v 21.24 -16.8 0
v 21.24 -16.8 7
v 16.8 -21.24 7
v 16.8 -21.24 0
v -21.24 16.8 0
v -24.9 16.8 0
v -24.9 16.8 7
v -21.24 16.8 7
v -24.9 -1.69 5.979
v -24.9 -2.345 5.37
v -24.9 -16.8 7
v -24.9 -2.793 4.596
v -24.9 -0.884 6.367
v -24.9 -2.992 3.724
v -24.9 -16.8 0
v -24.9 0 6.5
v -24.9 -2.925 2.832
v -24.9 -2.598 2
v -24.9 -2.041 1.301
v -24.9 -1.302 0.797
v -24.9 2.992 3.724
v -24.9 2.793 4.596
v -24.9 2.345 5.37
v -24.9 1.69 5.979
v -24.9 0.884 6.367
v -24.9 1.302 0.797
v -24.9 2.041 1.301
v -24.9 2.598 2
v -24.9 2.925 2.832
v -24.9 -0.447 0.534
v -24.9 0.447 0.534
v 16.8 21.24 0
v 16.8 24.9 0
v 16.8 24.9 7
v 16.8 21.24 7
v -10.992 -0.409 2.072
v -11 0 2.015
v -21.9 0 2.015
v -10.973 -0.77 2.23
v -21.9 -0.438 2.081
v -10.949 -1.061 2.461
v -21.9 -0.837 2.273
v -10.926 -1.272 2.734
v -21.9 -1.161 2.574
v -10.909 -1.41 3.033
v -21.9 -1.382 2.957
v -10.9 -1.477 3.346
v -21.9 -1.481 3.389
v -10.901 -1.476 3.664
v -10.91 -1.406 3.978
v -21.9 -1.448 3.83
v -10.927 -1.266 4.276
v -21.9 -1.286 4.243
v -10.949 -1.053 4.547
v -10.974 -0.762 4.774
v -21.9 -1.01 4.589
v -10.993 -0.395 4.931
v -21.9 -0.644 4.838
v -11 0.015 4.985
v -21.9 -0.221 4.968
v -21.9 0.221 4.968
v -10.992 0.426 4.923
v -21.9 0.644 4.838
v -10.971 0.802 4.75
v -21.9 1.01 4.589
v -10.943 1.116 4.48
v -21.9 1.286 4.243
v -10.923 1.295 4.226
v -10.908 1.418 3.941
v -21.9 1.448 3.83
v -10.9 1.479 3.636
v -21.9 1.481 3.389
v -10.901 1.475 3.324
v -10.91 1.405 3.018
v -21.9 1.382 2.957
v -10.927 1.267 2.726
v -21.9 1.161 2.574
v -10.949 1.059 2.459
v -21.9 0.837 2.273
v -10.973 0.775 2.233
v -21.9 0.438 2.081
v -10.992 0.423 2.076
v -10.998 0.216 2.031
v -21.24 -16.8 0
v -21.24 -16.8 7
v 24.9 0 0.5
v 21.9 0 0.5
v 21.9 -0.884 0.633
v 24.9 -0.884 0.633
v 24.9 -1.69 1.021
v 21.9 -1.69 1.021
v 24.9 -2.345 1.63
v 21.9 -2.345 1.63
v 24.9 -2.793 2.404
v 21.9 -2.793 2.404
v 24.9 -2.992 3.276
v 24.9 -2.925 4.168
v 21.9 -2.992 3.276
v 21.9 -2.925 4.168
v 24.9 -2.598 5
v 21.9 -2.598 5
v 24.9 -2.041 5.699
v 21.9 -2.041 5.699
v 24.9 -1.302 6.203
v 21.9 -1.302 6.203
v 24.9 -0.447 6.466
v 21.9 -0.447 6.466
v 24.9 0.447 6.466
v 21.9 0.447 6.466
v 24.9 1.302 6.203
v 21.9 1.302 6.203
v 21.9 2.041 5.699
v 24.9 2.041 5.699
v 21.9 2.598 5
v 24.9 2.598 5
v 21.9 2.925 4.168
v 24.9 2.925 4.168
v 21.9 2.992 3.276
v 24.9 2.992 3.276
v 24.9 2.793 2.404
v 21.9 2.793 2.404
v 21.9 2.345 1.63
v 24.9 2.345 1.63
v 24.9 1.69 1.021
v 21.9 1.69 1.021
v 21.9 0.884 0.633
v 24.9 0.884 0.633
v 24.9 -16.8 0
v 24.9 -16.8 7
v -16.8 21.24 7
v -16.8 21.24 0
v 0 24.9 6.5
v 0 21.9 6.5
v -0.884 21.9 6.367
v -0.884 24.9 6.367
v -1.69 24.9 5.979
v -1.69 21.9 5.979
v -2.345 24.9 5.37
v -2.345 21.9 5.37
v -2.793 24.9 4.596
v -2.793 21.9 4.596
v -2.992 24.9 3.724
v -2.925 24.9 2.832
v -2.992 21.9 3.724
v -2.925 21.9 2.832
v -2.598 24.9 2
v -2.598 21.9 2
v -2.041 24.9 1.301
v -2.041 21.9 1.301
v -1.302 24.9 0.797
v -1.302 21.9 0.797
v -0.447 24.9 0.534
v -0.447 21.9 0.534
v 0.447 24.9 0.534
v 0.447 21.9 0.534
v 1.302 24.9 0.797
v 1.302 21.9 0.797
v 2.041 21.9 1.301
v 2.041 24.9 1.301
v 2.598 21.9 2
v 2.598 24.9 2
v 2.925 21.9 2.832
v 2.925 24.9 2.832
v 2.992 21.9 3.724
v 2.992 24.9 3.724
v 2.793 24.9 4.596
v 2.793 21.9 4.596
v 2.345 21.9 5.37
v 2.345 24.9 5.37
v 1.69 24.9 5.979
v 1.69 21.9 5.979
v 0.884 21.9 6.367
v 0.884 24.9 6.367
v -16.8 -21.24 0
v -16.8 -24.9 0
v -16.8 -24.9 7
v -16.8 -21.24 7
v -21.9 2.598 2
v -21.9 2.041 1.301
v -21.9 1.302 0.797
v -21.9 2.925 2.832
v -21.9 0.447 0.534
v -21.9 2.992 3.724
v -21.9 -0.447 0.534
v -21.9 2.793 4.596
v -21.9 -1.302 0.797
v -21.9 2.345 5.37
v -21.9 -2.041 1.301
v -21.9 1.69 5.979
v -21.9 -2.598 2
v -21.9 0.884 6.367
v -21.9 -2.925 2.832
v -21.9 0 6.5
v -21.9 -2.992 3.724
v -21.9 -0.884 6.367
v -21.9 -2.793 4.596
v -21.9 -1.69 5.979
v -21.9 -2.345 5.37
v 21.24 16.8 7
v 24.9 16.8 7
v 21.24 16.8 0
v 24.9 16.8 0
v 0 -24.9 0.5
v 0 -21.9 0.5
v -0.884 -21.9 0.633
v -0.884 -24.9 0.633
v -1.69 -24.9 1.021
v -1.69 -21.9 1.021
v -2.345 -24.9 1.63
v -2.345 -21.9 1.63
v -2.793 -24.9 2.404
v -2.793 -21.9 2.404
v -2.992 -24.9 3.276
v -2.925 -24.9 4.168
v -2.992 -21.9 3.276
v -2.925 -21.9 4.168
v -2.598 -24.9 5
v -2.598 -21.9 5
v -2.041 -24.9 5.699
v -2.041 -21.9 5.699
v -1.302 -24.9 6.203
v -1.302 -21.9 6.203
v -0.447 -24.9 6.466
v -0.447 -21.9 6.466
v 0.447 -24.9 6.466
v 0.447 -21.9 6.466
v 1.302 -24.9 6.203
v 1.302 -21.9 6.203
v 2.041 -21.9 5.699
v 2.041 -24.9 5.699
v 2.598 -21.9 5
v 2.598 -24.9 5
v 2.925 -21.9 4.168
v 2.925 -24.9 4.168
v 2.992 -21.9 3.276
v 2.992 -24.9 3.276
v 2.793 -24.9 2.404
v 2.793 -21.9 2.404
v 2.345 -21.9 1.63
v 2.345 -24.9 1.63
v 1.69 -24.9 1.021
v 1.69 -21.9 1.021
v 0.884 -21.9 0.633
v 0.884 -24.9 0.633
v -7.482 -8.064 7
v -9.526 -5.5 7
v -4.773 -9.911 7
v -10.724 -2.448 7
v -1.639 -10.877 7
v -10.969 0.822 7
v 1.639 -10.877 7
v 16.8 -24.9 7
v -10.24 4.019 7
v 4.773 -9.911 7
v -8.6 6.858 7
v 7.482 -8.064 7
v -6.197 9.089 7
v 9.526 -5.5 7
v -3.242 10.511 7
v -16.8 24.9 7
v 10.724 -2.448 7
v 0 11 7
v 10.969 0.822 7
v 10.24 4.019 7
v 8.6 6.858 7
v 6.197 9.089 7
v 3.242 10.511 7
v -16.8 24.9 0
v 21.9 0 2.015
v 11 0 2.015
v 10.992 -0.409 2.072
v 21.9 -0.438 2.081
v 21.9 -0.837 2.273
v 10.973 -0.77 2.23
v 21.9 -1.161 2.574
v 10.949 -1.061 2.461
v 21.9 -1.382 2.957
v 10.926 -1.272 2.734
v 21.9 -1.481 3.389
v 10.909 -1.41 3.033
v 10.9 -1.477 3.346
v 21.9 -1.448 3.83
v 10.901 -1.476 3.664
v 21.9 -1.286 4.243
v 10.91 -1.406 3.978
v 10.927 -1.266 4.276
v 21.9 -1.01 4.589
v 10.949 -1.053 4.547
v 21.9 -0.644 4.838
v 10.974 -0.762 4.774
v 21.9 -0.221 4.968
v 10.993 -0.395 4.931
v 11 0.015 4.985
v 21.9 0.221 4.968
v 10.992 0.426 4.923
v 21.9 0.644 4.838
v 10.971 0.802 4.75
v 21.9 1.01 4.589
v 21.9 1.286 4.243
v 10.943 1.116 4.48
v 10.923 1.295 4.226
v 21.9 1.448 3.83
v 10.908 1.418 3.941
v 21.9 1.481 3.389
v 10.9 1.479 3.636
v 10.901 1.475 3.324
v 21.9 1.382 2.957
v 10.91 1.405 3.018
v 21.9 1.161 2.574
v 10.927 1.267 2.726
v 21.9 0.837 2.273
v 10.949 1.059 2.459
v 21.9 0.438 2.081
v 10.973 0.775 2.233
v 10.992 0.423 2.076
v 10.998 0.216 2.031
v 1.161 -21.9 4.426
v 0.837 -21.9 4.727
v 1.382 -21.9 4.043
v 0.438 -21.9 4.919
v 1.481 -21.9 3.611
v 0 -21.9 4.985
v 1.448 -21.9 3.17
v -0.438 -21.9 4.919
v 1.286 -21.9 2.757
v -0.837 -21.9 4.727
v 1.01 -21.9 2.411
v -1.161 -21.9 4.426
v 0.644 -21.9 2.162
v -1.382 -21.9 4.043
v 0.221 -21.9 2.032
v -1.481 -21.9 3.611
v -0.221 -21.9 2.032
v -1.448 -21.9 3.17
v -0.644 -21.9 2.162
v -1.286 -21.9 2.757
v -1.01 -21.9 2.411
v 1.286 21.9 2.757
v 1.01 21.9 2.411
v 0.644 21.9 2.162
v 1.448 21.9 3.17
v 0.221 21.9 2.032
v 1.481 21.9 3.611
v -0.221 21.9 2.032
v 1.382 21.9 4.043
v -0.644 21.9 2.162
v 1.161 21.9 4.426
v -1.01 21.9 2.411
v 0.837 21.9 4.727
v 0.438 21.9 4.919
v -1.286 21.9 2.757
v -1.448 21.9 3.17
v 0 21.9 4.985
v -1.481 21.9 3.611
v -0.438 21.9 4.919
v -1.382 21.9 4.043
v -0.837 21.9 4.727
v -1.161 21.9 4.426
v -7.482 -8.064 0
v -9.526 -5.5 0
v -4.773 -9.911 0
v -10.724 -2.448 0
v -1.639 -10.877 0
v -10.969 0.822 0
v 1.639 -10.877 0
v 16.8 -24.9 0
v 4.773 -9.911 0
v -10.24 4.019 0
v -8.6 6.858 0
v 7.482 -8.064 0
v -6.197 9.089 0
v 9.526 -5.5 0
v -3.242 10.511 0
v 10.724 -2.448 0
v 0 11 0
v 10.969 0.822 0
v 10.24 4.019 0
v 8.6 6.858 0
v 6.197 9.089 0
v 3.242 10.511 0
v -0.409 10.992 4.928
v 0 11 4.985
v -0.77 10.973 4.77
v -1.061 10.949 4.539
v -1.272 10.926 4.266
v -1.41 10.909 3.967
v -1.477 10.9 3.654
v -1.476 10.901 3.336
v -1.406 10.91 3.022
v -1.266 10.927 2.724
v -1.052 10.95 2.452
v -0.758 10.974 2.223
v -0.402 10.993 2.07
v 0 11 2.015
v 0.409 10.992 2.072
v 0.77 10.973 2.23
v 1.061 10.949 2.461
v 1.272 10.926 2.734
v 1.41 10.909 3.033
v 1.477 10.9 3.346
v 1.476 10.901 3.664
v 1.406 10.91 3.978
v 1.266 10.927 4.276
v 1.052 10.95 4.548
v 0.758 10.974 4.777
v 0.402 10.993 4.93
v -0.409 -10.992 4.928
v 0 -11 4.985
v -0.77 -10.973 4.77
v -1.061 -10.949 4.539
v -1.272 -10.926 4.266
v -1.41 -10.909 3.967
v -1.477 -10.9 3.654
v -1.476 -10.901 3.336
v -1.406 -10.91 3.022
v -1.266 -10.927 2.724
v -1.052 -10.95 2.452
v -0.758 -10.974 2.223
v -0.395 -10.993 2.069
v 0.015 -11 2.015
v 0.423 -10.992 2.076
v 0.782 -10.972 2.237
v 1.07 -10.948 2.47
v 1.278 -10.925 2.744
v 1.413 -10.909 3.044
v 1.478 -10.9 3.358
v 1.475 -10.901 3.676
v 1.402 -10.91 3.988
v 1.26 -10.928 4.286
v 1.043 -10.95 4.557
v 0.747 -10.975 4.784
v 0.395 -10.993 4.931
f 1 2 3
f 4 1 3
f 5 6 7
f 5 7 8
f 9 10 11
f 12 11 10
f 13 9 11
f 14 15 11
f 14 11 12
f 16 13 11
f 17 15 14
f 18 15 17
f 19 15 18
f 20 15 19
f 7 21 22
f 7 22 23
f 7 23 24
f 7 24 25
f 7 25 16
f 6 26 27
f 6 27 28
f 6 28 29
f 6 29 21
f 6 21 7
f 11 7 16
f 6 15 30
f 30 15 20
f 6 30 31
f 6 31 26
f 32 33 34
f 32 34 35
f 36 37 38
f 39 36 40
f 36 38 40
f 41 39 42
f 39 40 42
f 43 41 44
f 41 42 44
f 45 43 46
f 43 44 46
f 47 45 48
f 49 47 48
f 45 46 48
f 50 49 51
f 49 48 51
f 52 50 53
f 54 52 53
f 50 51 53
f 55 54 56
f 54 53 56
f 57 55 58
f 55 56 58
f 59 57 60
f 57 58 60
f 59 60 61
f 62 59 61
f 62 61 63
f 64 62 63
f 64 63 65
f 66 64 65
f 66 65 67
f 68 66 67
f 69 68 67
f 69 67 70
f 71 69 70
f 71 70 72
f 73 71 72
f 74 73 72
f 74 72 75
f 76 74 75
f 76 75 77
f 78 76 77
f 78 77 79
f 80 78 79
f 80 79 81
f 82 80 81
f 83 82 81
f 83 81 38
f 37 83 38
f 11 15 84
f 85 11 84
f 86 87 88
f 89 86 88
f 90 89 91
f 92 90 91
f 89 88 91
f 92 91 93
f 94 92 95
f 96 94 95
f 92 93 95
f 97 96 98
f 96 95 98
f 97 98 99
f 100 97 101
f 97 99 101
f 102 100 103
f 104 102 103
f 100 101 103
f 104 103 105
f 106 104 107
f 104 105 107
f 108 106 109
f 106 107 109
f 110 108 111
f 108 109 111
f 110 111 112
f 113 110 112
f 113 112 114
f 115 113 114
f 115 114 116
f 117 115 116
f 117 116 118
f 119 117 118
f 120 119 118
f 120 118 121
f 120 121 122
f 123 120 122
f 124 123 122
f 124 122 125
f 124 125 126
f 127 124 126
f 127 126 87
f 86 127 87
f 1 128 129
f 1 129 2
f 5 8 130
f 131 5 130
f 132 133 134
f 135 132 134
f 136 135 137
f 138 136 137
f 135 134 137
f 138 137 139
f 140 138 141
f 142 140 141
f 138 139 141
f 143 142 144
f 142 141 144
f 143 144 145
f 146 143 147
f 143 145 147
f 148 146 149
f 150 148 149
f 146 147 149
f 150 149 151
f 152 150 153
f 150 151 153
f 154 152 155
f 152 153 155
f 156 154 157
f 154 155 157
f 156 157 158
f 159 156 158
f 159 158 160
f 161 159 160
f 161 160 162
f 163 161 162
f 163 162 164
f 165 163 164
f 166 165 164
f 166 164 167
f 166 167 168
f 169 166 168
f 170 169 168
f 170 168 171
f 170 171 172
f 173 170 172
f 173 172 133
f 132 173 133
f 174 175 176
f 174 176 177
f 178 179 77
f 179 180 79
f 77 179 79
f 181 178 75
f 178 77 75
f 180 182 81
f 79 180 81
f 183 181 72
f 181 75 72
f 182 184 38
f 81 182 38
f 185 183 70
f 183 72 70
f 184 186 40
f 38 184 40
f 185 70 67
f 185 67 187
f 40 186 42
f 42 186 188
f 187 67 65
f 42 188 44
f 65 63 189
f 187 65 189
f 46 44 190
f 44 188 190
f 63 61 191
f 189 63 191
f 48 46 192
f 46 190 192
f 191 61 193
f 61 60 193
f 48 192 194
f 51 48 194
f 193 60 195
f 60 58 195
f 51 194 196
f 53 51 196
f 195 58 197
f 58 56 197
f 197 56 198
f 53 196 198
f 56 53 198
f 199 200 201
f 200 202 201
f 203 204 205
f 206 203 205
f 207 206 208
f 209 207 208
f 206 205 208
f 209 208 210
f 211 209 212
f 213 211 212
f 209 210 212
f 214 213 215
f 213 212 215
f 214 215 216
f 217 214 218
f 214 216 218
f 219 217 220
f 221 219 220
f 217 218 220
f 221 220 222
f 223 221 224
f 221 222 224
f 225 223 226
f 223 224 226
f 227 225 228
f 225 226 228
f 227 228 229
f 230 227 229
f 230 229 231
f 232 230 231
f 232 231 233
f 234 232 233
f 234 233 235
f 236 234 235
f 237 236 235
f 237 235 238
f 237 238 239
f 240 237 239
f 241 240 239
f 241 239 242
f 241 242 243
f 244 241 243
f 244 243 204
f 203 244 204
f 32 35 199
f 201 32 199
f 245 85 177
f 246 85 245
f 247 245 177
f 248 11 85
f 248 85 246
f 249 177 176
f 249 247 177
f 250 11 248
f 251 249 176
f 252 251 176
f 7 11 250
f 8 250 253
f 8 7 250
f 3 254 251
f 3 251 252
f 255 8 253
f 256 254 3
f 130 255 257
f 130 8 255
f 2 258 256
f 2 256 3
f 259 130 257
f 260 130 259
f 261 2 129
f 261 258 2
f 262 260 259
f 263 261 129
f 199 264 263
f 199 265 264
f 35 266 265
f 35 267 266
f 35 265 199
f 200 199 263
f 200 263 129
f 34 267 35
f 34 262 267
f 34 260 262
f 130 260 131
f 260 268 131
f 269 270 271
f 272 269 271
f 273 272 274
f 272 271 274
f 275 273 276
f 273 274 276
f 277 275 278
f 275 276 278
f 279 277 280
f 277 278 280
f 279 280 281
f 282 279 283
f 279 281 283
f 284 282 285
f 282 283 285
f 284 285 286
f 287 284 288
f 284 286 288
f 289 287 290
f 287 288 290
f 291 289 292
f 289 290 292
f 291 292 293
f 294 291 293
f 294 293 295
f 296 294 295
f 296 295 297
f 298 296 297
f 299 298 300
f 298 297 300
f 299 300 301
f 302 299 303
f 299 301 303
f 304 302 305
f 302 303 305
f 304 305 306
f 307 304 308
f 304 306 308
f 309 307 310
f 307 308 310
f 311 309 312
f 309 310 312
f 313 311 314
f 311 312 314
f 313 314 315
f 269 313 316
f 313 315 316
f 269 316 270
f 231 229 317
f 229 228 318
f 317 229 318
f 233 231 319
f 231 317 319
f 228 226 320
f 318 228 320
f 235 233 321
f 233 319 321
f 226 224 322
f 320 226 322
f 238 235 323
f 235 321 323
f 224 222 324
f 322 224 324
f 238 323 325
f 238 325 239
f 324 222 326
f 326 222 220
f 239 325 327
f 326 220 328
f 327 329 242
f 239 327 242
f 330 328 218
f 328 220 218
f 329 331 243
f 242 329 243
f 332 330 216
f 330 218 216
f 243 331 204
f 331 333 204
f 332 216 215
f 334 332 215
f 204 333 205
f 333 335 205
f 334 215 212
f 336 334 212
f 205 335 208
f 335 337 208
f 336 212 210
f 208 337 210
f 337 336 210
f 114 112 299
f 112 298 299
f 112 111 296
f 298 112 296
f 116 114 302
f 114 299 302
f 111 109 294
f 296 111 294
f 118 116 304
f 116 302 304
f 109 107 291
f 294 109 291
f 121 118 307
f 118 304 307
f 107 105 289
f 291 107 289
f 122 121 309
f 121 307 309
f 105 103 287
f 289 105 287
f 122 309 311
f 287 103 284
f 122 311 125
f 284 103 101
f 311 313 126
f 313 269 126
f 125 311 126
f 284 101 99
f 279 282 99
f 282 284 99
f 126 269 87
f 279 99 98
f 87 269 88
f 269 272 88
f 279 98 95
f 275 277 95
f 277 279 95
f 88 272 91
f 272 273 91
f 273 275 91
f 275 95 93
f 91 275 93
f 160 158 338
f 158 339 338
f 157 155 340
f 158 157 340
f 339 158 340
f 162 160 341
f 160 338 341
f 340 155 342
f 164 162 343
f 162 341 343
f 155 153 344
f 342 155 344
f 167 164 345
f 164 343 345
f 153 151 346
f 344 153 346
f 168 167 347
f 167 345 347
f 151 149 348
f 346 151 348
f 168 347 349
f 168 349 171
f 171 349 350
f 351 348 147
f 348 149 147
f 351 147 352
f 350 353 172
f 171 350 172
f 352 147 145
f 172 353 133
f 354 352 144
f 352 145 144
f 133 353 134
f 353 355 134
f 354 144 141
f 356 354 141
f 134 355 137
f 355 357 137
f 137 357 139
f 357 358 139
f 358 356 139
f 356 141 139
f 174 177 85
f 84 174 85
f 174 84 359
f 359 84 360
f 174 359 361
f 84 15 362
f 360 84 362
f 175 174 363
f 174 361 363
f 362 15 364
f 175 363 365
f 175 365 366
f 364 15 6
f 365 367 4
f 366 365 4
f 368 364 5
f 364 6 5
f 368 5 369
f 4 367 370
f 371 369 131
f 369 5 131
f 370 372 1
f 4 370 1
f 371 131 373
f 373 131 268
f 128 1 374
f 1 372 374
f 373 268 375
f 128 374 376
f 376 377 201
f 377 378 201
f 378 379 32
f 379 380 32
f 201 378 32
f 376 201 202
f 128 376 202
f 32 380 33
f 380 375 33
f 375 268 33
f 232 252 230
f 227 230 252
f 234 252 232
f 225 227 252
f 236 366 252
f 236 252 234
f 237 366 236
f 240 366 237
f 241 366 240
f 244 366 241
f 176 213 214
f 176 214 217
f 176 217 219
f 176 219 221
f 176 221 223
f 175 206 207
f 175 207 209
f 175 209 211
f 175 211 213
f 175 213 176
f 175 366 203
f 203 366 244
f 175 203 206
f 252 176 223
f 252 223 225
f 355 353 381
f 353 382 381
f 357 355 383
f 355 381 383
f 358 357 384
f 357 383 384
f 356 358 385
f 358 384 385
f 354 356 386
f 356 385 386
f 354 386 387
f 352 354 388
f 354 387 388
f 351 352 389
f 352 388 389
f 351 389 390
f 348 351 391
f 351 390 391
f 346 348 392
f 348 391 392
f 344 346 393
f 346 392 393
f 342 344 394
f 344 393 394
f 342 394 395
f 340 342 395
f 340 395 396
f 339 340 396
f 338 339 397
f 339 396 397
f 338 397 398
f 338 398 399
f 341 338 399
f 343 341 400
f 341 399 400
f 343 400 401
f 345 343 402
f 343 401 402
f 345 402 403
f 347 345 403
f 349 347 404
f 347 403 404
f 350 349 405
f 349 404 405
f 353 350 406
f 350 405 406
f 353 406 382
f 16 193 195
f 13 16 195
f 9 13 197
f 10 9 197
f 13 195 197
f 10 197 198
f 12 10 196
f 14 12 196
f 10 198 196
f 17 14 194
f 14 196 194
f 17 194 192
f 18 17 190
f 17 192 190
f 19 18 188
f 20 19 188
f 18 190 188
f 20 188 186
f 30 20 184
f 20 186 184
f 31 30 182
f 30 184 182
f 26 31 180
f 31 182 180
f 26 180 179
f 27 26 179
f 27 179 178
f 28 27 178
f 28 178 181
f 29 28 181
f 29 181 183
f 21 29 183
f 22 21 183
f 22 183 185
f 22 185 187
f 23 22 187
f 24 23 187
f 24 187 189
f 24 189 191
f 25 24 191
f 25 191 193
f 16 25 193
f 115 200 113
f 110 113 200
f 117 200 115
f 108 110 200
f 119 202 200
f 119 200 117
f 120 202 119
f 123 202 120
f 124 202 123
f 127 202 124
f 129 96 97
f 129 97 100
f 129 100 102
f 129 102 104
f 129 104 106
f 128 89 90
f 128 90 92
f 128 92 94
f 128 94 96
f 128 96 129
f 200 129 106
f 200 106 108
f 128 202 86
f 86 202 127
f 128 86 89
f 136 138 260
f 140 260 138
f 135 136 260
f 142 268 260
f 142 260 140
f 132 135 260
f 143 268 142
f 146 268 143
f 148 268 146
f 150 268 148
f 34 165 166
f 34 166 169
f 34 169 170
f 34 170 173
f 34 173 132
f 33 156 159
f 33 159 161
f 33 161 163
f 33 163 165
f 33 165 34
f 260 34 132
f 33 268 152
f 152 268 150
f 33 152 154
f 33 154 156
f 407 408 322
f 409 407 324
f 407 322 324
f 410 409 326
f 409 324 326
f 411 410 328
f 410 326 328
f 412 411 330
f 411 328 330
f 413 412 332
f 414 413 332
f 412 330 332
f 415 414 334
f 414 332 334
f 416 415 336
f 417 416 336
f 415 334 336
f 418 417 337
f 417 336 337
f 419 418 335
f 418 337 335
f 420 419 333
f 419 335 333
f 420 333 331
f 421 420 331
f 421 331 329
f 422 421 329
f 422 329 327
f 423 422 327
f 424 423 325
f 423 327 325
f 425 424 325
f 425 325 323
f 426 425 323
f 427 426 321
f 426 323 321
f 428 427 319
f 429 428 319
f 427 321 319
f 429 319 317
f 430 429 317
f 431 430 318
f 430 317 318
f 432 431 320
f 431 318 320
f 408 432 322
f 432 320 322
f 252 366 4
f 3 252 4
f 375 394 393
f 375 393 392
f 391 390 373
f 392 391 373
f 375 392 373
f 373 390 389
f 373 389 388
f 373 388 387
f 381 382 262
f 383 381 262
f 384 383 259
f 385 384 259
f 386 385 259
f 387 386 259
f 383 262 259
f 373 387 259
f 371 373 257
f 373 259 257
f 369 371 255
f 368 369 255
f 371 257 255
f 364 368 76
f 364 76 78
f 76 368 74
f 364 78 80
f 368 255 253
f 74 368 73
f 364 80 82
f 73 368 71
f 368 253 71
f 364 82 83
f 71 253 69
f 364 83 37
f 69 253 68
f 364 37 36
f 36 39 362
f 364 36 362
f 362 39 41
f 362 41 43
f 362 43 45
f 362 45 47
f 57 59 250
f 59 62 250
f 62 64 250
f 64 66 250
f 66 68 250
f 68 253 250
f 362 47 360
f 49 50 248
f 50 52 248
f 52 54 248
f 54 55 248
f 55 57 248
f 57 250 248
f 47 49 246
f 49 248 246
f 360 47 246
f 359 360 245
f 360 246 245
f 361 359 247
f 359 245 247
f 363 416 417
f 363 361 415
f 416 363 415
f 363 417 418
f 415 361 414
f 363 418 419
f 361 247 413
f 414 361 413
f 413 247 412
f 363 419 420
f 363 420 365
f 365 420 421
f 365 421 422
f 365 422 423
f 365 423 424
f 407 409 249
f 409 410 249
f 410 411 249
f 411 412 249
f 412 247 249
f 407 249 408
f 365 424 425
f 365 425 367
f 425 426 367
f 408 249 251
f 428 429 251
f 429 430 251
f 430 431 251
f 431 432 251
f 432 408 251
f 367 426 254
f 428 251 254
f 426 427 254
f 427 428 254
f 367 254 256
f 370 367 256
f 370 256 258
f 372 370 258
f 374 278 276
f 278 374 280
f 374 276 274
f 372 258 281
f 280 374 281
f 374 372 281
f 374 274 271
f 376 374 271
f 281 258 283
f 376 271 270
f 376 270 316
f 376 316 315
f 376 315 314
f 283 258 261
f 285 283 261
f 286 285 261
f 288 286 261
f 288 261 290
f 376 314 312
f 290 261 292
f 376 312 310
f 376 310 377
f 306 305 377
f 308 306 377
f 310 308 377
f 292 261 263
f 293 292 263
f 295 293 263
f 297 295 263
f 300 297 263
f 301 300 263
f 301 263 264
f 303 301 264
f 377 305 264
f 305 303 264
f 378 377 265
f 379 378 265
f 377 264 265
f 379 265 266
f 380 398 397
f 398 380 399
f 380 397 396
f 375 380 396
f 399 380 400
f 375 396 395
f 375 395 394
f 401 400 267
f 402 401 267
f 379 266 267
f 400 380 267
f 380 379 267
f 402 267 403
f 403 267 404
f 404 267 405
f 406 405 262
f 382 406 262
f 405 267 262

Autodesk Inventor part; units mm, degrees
ref_plane "YZ Plane" through (0, 0, 0) normal (1, 0, 0) x (0, 1, 0)
ref_plane "XZ Plane" through (0, 0, 0) normal (0, 1, 0) x (-1, 0, 0)
ref_plane "XY Plane" through (0, 0, 0) normal (0, 0, 1) x (1, 0, 0)
sketch "草图1" plane through (0, 0, 0) normal (0, 0, 1) x (1, 0, 0)
  line L0 (24.9, 16.8) -> (24.9, 0)
  line L1 (24.9, 0) -> (24.9, -16.8)
  line L2 (24.9, 0) -> (41.7, 0) construction
  line L3 (24.9, -16.8) -> (21.24, -16.8)
  line L4 (24.9, 16.8) -> (21.24, 16.8)
  line L5 (-16.8, 24.9) -> (0, 24.9)
  line L6 (0, 24.9) -> (16.8, 24.9)
  line L7 (16.8, 24.9) -> (16.8, 21.24)
  line L8 (-16.8, 24.9) -> (-16.8, 21.24)
  line L9 (-24.9, -16.8) -> (-24.9, 0)
  line L10 (-24.9, 0) -> (-24.9, 16.8)
  line L11 (-24.9, 0) -> (-41.7, 0) construction
  line L12 (-24.9, 16.8) -> (-21.24, 16.8)
  line L13 (-24.9, -16.8) -> (-21.24, -16.8)
  line L14 (16.8, -24.9) -> (0, -24.9)
  line L15 (0, -24.9) -> (-16.8, -24.9)
  line L16 (-16.8, -24.9) -> (-16.8, -21.24)
  line L17 (16.8, -24.9) -> (16.8, -21.24)
  line L18 (-21.24, 16.8) -> (-16.8, 21.24)
  line L19 (16.8, 21.24) -> (21.24, 16.8)
  line L20 (21.24, -16.8) -> (16.8, -21.24)
  line L21 (-16.8, -21.24) -> (-21.24, -16.8)
  point P0 (0, 0)
extrude "拉伸1" add sketch "草图1" along normal blind 7
sketch "草图2" plane through (-16.8, 24.9, 0) normal (0, 1, 0) x (1, 0, 0)
  line L0 (0, -7) -> (33.6, -7) projected
  point P0 (16.8, -3.5)
hole "孔1" at (0, 24.9, 3.5) direction (0, -1, 0) diameter 2.97 end through all counterbore diameter 6 counterbore depth 3
sketch "草图3" plane through (-16.8, -24.9, 0) normal (0, -1, 0) x (1, 0, 0)
  point P0 (16.8, 3.5)
hole "孔2" at (0, -24.9, 3.5) direction (0, 1, 0) diameter 2.97 end through all counterbore diameter 6 counterbore depth 3
sketch "草图4" plane through (24.9, -16.8, 0) normal (1, 0, 0) x (0, 0, -1)
  point P0 (0, 16.8)
  point P1 (-3.5, 16.8)
hole "孔3" at (24.9, 0, 3.5) direction (-1, 0, 0) diameter 2.97 end through all counterbore diameter 6 counterbore depth 3
sketch "草图5" plane through (-24.9, -16.8, 0) normal (-1, 0, 0) x (0, 0, 1)
  point P0 (0, 16.8)
  point P1 (3.5, 16.8)
hole "孔4" at (-24.9, 0, 3.5) direction (1, 0, 0) diameter 2.97 end through all counterbore diameter 6 counterbore depth 3
sketch "草图6" plane through (0, 0, 0) normal (0, 0, -1) x (-1, 0, 0)
  point P0 (0, 0)
hole "孔5" at (0, 0, 0) direction (0, 0, 1) diameter 22 end through all
equation "\"d53\" = Thickness"
equation "\"BendRadius\" = Thickness"
equation "\"BendReliefWidth\" = Thickness"
equation "\"BendReliefDepth\" = 0.5 * Thickness"
equation "\"CornerReliefSize\" = 4 * Thickness"
equation "\"MinimumRemnant\" = 2 * Thickness"
equation "\"TransitionRadius\" = BendRadius"
equation "\"JacobiRadiusSize\" = BendRadius"
equation "\"Thickness\" = 0.5"
properties part number "LaserHolder_20mm"
